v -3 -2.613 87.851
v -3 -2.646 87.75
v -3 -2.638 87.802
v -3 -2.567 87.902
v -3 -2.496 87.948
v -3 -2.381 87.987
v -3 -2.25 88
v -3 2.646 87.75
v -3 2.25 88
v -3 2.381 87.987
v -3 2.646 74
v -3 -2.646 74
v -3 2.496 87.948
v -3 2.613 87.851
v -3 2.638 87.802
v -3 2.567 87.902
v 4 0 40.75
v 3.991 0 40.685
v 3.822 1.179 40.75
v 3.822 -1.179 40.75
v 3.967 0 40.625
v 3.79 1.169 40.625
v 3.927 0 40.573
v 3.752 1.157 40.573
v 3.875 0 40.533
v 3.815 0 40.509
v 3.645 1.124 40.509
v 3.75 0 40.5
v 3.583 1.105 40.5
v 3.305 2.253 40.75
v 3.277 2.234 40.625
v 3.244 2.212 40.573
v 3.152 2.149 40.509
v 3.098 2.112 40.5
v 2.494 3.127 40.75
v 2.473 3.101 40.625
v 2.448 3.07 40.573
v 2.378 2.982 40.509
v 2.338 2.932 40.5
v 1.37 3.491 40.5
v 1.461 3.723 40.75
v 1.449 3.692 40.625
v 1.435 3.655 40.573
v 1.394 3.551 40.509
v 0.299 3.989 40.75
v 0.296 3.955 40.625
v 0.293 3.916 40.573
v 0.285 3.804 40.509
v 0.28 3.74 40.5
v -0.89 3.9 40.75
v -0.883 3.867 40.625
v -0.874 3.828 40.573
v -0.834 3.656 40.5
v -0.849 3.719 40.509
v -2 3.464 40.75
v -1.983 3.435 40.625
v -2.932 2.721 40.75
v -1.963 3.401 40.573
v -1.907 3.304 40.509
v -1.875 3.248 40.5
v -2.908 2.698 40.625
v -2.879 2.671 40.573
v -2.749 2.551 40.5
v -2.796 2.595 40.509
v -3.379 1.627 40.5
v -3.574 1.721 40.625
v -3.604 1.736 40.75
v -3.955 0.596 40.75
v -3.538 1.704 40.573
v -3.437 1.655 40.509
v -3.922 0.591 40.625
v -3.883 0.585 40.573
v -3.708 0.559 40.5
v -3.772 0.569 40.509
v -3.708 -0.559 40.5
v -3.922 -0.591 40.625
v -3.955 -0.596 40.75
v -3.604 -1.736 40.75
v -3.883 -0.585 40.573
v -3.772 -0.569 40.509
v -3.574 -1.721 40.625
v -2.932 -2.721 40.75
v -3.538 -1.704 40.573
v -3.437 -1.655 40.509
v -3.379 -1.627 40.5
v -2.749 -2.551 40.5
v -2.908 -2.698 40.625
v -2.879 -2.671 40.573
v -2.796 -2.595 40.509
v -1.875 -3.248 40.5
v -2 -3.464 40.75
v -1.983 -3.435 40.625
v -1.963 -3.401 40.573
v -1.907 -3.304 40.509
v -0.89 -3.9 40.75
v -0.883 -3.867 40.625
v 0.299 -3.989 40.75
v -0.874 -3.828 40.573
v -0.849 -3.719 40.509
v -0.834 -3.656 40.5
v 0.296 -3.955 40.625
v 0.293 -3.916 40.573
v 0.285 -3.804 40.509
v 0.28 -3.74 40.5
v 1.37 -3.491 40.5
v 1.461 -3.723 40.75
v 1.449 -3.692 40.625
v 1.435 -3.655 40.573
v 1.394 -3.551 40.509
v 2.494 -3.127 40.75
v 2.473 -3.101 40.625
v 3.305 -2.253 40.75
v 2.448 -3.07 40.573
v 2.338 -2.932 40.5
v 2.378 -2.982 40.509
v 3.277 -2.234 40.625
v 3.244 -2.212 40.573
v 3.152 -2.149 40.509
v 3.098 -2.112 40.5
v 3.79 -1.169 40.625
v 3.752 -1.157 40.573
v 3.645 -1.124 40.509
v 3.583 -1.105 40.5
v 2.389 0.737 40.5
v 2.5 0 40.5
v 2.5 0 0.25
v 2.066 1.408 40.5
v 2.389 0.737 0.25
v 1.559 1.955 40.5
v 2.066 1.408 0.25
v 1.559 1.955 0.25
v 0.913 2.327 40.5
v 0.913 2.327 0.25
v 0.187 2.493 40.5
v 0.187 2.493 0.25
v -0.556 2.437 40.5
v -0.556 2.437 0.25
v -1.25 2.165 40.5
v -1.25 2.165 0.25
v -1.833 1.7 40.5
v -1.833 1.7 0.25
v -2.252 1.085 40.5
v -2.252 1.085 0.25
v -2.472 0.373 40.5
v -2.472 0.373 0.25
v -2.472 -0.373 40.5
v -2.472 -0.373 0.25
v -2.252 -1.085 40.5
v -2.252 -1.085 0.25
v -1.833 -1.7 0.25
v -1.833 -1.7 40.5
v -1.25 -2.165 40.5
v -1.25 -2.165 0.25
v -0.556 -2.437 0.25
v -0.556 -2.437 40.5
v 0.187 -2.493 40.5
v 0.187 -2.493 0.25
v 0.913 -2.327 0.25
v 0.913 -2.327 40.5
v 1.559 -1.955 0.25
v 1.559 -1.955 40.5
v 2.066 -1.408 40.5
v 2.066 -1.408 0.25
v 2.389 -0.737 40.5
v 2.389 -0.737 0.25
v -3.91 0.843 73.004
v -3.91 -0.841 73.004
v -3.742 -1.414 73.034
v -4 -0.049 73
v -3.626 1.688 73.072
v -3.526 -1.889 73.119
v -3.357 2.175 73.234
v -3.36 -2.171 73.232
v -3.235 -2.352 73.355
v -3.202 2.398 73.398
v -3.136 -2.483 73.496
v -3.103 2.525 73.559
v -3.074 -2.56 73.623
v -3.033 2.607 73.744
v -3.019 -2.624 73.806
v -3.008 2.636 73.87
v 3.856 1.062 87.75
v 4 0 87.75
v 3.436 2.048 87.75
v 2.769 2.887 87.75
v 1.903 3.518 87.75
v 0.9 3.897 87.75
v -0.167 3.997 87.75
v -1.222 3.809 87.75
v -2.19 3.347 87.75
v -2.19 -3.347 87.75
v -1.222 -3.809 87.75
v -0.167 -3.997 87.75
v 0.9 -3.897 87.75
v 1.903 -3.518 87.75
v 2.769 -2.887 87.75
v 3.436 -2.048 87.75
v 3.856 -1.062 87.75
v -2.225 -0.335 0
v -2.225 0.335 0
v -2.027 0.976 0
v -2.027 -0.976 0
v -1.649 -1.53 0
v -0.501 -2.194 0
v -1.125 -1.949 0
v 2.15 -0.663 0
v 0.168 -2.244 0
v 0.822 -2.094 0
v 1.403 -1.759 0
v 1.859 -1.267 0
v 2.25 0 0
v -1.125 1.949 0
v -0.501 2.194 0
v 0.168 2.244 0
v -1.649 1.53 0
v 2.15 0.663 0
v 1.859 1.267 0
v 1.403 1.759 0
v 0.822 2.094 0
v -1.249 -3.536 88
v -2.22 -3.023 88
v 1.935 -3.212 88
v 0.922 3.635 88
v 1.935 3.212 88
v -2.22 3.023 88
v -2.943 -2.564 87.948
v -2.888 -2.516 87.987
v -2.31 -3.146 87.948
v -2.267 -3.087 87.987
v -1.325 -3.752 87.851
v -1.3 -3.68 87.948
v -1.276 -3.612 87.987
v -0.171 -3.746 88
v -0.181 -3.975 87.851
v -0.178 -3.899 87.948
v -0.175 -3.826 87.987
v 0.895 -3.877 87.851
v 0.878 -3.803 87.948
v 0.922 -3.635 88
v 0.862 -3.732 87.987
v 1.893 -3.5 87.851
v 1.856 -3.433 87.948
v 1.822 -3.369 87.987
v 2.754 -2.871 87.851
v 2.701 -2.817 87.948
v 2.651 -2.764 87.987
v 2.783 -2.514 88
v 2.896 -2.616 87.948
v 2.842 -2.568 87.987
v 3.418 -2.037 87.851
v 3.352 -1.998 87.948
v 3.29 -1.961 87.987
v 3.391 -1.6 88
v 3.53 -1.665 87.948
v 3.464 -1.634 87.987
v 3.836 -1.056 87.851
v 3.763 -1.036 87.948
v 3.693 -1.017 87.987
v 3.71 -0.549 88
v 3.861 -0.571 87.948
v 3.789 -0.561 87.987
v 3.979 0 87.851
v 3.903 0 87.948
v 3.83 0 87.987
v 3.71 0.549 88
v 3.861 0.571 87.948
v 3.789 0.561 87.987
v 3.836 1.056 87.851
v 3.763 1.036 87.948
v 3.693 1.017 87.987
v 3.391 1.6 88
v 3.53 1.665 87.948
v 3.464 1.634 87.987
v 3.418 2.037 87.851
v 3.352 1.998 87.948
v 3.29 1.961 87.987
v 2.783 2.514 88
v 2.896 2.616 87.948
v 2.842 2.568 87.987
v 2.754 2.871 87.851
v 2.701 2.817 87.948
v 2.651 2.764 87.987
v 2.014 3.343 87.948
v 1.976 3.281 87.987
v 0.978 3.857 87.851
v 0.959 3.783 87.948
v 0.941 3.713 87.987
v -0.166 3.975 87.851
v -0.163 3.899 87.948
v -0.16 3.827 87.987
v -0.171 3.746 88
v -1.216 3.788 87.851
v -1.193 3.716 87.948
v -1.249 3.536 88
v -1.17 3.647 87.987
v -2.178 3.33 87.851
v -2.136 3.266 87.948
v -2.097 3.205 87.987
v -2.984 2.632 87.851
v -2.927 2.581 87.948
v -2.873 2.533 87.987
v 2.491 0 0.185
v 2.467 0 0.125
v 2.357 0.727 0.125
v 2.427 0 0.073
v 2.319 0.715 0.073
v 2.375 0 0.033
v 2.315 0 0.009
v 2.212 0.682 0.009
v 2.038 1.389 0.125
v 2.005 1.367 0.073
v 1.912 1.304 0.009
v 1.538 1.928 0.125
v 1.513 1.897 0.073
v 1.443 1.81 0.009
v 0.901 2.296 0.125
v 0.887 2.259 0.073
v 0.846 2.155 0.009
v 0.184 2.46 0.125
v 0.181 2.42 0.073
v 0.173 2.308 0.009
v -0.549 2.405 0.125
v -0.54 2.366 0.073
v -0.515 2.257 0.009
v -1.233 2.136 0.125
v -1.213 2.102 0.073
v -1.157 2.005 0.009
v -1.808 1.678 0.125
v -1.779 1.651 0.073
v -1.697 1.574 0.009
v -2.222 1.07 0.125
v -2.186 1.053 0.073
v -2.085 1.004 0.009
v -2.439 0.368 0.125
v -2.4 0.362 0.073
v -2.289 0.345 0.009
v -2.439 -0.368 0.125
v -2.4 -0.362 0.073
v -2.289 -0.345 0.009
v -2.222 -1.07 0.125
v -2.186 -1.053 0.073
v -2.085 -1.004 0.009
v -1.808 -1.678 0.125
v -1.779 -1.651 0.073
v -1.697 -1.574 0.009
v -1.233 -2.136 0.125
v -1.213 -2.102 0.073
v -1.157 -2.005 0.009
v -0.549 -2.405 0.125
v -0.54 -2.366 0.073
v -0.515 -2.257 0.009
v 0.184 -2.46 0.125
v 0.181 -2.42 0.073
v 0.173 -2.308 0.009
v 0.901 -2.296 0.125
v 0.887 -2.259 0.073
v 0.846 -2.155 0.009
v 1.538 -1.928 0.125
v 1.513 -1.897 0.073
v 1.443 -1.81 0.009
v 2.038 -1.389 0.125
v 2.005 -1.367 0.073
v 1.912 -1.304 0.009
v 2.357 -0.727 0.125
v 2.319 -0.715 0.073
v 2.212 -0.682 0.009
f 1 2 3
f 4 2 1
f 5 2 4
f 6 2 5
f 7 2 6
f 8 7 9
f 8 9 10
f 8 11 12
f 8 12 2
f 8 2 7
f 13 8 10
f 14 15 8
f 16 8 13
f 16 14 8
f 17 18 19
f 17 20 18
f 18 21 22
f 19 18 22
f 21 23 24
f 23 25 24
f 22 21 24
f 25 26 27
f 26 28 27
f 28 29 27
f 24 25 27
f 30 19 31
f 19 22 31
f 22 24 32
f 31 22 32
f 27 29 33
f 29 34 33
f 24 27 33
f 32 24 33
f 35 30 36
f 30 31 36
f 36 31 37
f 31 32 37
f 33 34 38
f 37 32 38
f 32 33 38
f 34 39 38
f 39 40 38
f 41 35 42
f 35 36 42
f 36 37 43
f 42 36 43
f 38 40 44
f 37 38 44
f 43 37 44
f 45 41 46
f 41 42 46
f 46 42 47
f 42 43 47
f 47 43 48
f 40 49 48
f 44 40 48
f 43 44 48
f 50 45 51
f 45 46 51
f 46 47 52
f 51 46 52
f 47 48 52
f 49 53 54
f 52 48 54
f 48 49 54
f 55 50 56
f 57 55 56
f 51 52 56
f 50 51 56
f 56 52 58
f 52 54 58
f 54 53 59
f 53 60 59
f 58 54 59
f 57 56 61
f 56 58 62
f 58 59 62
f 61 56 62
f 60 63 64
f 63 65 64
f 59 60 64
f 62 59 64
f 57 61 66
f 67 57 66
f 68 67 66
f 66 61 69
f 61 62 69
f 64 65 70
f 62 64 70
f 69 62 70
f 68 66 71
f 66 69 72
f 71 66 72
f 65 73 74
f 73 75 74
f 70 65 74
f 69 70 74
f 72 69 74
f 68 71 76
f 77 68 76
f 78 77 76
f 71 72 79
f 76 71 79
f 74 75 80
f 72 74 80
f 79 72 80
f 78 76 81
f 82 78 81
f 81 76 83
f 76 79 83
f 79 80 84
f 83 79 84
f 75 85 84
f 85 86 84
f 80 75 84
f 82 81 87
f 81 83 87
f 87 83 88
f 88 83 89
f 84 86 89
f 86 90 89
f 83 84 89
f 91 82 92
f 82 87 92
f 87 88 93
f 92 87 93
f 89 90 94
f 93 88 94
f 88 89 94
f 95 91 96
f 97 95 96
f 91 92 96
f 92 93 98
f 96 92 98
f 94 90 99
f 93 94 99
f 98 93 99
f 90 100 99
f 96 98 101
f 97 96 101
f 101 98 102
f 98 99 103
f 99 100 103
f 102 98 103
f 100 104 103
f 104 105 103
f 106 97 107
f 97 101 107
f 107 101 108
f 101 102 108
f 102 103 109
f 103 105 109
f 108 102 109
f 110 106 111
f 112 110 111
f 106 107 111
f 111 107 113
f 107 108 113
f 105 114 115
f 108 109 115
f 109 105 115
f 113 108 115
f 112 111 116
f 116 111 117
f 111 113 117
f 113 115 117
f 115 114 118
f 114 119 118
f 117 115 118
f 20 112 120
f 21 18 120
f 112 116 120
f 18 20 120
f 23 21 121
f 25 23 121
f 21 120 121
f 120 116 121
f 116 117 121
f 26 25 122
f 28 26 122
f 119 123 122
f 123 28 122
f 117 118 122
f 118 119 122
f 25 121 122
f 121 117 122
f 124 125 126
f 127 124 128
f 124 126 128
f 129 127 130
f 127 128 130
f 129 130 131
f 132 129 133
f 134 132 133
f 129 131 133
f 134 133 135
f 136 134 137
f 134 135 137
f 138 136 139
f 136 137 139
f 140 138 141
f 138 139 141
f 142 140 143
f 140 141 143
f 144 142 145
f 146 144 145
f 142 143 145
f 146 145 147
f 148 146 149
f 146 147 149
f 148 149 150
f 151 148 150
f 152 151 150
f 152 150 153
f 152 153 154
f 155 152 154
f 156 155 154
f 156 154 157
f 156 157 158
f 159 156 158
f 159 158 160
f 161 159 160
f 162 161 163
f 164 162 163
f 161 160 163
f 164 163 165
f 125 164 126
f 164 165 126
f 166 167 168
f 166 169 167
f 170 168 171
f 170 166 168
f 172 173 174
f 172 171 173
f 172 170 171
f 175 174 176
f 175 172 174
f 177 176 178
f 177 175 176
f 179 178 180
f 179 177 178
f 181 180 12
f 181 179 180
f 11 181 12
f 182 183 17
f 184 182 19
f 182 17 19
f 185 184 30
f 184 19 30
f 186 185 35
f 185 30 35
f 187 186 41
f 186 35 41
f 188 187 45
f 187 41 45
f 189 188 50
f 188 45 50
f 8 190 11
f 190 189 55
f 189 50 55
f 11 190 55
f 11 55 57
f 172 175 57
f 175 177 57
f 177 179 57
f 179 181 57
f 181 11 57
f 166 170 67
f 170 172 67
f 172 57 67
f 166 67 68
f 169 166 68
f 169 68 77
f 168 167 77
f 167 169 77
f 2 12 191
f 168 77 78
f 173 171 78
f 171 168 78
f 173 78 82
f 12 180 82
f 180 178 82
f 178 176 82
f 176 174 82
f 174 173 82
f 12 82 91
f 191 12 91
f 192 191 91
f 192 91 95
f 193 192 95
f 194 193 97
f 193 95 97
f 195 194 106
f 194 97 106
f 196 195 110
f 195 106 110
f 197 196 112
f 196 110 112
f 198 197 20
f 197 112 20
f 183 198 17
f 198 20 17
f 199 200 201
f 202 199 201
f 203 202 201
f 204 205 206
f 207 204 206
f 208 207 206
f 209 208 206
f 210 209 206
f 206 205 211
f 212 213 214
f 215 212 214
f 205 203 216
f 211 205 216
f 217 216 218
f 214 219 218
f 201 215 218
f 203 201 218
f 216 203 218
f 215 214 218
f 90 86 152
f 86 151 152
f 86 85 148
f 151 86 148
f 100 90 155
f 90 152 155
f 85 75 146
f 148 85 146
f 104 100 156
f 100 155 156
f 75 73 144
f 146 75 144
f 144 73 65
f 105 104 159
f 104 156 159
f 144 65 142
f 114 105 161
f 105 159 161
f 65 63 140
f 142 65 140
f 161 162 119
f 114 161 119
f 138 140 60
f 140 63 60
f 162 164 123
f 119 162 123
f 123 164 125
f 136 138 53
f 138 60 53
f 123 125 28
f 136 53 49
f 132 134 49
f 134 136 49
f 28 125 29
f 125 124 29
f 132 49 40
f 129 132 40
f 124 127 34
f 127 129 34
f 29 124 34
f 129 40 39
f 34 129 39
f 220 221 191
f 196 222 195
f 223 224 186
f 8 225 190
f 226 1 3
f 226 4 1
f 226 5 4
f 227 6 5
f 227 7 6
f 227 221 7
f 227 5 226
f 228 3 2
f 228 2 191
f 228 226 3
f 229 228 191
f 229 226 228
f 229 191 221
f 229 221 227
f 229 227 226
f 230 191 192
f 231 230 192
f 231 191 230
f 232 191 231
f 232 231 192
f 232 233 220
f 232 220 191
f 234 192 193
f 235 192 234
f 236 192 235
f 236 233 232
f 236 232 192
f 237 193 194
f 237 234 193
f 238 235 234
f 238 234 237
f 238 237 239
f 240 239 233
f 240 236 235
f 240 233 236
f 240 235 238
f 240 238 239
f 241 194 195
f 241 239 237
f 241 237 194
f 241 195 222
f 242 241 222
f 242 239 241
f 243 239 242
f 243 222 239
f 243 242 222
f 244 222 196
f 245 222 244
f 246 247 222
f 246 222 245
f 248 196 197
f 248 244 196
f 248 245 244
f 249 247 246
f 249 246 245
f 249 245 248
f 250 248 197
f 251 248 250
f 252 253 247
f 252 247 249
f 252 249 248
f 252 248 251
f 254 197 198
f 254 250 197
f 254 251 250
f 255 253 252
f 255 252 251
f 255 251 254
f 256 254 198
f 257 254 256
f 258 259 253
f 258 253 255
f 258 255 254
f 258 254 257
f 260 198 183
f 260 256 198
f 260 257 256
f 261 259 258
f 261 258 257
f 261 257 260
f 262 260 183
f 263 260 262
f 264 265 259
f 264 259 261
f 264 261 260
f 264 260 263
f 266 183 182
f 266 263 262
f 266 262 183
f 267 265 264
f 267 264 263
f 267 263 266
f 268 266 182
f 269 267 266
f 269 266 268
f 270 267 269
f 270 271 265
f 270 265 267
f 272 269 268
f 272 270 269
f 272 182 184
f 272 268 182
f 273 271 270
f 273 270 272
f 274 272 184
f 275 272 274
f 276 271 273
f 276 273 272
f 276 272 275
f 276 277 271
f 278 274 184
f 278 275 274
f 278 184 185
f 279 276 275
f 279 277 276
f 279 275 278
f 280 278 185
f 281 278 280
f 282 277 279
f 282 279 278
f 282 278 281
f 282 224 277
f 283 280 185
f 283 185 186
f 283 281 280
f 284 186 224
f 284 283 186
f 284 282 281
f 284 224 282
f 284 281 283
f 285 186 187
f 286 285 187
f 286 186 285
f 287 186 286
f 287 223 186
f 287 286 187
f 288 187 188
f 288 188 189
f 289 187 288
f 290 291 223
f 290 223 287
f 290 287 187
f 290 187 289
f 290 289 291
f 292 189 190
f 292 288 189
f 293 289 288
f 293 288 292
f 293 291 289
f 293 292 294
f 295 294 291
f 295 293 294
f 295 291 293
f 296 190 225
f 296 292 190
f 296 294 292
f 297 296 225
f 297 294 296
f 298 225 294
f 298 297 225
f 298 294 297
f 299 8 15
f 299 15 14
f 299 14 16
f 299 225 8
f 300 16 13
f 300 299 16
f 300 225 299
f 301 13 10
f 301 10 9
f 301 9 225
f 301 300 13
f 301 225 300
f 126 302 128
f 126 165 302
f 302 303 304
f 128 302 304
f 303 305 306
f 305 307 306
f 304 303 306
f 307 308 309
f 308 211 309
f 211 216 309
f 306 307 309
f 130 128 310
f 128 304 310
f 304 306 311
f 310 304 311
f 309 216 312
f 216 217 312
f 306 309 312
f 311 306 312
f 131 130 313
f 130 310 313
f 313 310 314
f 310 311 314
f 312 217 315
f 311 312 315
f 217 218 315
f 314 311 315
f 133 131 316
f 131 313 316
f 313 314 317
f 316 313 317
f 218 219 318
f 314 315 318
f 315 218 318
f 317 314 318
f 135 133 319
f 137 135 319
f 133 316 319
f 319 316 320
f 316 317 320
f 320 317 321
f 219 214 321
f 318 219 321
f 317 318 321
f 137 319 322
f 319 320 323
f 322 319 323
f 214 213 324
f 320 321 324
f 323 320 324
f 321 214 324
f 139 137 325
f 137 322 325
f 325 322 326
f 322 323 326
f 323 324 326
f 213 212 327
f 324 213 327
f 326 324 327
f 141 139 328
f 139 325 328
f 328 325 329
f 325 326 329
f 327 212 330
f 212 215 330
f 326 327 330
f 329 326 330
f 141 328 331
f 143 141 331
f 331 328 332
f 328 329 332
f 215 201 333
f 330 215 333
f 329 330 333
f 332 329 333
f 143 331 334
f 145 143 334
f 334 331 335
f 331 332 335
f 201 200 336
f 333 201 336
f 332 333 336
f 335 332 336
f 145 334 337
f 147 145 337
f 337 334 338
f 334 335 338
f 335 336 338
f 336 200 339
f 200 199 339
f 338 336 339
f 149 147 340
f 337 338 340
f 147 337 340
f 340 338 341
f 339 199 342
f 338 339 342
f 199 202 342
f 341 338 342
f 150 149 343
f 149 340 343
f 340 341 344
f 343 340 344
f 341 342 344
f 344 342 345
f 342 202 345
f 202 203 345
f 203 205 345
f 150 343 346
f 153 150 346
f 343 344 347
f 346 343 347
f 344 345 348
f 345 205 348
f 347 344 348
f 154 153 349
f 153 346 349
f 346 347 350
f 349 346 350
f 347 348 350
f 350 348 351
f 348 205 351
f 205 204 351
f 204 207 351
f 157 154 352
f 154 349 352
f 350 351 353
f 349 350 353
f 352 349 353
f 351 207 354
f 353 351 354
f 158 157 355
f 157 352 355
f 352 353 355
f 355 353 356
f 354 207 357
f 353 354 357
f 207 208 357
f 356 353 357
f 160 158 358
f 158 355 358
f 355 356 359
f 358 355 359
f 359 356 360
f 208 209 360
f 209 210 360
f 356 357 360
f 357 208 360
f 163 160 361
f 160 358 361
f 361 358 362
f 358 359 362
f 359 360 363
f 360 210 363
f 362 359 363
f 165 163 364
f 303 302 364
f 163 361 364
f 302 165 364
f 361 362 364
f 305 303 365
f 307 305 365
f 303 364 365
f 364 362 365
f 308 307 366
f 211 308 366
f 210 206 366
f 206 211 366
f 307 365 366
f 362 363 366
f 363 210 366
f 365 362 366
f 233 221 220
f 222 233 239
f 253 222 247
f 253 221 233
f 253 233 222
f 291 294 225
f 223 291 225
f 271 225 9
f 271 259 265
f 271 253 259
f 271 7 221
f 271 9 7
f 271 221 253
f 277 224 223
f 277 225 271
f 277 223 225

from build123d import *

# Parameters (mm, degrees)
SKETCH1_R               = 2.5
EXTRUDE1_DEPTH          = 40.5
SKETCH3_R               = 4
BOSS_EXTRUDE1_DEPTH     = 47.5
FILLET1_R               = 0.25
CUT_EXTRUDE1_DEPTH      = 3
CUT_EXTRUDE1_DEPTH_BACK = 3


with BuildPart() as part:
    # Sketch1 → Extrude1 (new body)
    with BuildSketch(Plane.XY):
        Circle(SKETCH1_R)
    extrude(amount=EXTRUDE1_DEPTH)

    # Sketch3 → Boss-Extrude1 (add)
    with BuildSketch(Plane.XY.offset(40.5)):
        Circle(SKETCH3_R)
    extrude(amount=BOSS_EXTRUDE1_DEPTH)

    # Fillet1
    fillet1_edges = [part.edges().sort_by_distance(p)[0] for p in [
        (-4, 0, 88),
        (-4, 0, 40.5),
        (-2.5, 0, 0),
    ]]
    fillet(fillet1_edges, radius=FILLET1_R)

    # Sketch2 → Cut-Extrude1 (cut, two sides: drawn at the far end of the back side and taken through both)
    with BuildSketch(Plane(origin=(0, 0, 0), x_dir=(1, 0, 0), z_dir=(0, 1, 0)).offset(-CUT_EXTRUDE1_DEPTH_BACK)):
        with BuildLine():
            Line((-3, -88), (-5, -88))
            Line((-5, -88), (-5, -73))
            Line((-5, -73), (-4, -73))
            ThreePointArc((-4, -73), (-3.292893219, -73.292893219), (-3, -74))
            Line((-3, -74), (-3, -88))
        make_face()
    extrude(amount=CUT_EXTRUDE1_DEPTH + CUT_EXTRUDE1_DEPTH_BACK, mode=Mode.SUBTRACT)


solid = part.part
